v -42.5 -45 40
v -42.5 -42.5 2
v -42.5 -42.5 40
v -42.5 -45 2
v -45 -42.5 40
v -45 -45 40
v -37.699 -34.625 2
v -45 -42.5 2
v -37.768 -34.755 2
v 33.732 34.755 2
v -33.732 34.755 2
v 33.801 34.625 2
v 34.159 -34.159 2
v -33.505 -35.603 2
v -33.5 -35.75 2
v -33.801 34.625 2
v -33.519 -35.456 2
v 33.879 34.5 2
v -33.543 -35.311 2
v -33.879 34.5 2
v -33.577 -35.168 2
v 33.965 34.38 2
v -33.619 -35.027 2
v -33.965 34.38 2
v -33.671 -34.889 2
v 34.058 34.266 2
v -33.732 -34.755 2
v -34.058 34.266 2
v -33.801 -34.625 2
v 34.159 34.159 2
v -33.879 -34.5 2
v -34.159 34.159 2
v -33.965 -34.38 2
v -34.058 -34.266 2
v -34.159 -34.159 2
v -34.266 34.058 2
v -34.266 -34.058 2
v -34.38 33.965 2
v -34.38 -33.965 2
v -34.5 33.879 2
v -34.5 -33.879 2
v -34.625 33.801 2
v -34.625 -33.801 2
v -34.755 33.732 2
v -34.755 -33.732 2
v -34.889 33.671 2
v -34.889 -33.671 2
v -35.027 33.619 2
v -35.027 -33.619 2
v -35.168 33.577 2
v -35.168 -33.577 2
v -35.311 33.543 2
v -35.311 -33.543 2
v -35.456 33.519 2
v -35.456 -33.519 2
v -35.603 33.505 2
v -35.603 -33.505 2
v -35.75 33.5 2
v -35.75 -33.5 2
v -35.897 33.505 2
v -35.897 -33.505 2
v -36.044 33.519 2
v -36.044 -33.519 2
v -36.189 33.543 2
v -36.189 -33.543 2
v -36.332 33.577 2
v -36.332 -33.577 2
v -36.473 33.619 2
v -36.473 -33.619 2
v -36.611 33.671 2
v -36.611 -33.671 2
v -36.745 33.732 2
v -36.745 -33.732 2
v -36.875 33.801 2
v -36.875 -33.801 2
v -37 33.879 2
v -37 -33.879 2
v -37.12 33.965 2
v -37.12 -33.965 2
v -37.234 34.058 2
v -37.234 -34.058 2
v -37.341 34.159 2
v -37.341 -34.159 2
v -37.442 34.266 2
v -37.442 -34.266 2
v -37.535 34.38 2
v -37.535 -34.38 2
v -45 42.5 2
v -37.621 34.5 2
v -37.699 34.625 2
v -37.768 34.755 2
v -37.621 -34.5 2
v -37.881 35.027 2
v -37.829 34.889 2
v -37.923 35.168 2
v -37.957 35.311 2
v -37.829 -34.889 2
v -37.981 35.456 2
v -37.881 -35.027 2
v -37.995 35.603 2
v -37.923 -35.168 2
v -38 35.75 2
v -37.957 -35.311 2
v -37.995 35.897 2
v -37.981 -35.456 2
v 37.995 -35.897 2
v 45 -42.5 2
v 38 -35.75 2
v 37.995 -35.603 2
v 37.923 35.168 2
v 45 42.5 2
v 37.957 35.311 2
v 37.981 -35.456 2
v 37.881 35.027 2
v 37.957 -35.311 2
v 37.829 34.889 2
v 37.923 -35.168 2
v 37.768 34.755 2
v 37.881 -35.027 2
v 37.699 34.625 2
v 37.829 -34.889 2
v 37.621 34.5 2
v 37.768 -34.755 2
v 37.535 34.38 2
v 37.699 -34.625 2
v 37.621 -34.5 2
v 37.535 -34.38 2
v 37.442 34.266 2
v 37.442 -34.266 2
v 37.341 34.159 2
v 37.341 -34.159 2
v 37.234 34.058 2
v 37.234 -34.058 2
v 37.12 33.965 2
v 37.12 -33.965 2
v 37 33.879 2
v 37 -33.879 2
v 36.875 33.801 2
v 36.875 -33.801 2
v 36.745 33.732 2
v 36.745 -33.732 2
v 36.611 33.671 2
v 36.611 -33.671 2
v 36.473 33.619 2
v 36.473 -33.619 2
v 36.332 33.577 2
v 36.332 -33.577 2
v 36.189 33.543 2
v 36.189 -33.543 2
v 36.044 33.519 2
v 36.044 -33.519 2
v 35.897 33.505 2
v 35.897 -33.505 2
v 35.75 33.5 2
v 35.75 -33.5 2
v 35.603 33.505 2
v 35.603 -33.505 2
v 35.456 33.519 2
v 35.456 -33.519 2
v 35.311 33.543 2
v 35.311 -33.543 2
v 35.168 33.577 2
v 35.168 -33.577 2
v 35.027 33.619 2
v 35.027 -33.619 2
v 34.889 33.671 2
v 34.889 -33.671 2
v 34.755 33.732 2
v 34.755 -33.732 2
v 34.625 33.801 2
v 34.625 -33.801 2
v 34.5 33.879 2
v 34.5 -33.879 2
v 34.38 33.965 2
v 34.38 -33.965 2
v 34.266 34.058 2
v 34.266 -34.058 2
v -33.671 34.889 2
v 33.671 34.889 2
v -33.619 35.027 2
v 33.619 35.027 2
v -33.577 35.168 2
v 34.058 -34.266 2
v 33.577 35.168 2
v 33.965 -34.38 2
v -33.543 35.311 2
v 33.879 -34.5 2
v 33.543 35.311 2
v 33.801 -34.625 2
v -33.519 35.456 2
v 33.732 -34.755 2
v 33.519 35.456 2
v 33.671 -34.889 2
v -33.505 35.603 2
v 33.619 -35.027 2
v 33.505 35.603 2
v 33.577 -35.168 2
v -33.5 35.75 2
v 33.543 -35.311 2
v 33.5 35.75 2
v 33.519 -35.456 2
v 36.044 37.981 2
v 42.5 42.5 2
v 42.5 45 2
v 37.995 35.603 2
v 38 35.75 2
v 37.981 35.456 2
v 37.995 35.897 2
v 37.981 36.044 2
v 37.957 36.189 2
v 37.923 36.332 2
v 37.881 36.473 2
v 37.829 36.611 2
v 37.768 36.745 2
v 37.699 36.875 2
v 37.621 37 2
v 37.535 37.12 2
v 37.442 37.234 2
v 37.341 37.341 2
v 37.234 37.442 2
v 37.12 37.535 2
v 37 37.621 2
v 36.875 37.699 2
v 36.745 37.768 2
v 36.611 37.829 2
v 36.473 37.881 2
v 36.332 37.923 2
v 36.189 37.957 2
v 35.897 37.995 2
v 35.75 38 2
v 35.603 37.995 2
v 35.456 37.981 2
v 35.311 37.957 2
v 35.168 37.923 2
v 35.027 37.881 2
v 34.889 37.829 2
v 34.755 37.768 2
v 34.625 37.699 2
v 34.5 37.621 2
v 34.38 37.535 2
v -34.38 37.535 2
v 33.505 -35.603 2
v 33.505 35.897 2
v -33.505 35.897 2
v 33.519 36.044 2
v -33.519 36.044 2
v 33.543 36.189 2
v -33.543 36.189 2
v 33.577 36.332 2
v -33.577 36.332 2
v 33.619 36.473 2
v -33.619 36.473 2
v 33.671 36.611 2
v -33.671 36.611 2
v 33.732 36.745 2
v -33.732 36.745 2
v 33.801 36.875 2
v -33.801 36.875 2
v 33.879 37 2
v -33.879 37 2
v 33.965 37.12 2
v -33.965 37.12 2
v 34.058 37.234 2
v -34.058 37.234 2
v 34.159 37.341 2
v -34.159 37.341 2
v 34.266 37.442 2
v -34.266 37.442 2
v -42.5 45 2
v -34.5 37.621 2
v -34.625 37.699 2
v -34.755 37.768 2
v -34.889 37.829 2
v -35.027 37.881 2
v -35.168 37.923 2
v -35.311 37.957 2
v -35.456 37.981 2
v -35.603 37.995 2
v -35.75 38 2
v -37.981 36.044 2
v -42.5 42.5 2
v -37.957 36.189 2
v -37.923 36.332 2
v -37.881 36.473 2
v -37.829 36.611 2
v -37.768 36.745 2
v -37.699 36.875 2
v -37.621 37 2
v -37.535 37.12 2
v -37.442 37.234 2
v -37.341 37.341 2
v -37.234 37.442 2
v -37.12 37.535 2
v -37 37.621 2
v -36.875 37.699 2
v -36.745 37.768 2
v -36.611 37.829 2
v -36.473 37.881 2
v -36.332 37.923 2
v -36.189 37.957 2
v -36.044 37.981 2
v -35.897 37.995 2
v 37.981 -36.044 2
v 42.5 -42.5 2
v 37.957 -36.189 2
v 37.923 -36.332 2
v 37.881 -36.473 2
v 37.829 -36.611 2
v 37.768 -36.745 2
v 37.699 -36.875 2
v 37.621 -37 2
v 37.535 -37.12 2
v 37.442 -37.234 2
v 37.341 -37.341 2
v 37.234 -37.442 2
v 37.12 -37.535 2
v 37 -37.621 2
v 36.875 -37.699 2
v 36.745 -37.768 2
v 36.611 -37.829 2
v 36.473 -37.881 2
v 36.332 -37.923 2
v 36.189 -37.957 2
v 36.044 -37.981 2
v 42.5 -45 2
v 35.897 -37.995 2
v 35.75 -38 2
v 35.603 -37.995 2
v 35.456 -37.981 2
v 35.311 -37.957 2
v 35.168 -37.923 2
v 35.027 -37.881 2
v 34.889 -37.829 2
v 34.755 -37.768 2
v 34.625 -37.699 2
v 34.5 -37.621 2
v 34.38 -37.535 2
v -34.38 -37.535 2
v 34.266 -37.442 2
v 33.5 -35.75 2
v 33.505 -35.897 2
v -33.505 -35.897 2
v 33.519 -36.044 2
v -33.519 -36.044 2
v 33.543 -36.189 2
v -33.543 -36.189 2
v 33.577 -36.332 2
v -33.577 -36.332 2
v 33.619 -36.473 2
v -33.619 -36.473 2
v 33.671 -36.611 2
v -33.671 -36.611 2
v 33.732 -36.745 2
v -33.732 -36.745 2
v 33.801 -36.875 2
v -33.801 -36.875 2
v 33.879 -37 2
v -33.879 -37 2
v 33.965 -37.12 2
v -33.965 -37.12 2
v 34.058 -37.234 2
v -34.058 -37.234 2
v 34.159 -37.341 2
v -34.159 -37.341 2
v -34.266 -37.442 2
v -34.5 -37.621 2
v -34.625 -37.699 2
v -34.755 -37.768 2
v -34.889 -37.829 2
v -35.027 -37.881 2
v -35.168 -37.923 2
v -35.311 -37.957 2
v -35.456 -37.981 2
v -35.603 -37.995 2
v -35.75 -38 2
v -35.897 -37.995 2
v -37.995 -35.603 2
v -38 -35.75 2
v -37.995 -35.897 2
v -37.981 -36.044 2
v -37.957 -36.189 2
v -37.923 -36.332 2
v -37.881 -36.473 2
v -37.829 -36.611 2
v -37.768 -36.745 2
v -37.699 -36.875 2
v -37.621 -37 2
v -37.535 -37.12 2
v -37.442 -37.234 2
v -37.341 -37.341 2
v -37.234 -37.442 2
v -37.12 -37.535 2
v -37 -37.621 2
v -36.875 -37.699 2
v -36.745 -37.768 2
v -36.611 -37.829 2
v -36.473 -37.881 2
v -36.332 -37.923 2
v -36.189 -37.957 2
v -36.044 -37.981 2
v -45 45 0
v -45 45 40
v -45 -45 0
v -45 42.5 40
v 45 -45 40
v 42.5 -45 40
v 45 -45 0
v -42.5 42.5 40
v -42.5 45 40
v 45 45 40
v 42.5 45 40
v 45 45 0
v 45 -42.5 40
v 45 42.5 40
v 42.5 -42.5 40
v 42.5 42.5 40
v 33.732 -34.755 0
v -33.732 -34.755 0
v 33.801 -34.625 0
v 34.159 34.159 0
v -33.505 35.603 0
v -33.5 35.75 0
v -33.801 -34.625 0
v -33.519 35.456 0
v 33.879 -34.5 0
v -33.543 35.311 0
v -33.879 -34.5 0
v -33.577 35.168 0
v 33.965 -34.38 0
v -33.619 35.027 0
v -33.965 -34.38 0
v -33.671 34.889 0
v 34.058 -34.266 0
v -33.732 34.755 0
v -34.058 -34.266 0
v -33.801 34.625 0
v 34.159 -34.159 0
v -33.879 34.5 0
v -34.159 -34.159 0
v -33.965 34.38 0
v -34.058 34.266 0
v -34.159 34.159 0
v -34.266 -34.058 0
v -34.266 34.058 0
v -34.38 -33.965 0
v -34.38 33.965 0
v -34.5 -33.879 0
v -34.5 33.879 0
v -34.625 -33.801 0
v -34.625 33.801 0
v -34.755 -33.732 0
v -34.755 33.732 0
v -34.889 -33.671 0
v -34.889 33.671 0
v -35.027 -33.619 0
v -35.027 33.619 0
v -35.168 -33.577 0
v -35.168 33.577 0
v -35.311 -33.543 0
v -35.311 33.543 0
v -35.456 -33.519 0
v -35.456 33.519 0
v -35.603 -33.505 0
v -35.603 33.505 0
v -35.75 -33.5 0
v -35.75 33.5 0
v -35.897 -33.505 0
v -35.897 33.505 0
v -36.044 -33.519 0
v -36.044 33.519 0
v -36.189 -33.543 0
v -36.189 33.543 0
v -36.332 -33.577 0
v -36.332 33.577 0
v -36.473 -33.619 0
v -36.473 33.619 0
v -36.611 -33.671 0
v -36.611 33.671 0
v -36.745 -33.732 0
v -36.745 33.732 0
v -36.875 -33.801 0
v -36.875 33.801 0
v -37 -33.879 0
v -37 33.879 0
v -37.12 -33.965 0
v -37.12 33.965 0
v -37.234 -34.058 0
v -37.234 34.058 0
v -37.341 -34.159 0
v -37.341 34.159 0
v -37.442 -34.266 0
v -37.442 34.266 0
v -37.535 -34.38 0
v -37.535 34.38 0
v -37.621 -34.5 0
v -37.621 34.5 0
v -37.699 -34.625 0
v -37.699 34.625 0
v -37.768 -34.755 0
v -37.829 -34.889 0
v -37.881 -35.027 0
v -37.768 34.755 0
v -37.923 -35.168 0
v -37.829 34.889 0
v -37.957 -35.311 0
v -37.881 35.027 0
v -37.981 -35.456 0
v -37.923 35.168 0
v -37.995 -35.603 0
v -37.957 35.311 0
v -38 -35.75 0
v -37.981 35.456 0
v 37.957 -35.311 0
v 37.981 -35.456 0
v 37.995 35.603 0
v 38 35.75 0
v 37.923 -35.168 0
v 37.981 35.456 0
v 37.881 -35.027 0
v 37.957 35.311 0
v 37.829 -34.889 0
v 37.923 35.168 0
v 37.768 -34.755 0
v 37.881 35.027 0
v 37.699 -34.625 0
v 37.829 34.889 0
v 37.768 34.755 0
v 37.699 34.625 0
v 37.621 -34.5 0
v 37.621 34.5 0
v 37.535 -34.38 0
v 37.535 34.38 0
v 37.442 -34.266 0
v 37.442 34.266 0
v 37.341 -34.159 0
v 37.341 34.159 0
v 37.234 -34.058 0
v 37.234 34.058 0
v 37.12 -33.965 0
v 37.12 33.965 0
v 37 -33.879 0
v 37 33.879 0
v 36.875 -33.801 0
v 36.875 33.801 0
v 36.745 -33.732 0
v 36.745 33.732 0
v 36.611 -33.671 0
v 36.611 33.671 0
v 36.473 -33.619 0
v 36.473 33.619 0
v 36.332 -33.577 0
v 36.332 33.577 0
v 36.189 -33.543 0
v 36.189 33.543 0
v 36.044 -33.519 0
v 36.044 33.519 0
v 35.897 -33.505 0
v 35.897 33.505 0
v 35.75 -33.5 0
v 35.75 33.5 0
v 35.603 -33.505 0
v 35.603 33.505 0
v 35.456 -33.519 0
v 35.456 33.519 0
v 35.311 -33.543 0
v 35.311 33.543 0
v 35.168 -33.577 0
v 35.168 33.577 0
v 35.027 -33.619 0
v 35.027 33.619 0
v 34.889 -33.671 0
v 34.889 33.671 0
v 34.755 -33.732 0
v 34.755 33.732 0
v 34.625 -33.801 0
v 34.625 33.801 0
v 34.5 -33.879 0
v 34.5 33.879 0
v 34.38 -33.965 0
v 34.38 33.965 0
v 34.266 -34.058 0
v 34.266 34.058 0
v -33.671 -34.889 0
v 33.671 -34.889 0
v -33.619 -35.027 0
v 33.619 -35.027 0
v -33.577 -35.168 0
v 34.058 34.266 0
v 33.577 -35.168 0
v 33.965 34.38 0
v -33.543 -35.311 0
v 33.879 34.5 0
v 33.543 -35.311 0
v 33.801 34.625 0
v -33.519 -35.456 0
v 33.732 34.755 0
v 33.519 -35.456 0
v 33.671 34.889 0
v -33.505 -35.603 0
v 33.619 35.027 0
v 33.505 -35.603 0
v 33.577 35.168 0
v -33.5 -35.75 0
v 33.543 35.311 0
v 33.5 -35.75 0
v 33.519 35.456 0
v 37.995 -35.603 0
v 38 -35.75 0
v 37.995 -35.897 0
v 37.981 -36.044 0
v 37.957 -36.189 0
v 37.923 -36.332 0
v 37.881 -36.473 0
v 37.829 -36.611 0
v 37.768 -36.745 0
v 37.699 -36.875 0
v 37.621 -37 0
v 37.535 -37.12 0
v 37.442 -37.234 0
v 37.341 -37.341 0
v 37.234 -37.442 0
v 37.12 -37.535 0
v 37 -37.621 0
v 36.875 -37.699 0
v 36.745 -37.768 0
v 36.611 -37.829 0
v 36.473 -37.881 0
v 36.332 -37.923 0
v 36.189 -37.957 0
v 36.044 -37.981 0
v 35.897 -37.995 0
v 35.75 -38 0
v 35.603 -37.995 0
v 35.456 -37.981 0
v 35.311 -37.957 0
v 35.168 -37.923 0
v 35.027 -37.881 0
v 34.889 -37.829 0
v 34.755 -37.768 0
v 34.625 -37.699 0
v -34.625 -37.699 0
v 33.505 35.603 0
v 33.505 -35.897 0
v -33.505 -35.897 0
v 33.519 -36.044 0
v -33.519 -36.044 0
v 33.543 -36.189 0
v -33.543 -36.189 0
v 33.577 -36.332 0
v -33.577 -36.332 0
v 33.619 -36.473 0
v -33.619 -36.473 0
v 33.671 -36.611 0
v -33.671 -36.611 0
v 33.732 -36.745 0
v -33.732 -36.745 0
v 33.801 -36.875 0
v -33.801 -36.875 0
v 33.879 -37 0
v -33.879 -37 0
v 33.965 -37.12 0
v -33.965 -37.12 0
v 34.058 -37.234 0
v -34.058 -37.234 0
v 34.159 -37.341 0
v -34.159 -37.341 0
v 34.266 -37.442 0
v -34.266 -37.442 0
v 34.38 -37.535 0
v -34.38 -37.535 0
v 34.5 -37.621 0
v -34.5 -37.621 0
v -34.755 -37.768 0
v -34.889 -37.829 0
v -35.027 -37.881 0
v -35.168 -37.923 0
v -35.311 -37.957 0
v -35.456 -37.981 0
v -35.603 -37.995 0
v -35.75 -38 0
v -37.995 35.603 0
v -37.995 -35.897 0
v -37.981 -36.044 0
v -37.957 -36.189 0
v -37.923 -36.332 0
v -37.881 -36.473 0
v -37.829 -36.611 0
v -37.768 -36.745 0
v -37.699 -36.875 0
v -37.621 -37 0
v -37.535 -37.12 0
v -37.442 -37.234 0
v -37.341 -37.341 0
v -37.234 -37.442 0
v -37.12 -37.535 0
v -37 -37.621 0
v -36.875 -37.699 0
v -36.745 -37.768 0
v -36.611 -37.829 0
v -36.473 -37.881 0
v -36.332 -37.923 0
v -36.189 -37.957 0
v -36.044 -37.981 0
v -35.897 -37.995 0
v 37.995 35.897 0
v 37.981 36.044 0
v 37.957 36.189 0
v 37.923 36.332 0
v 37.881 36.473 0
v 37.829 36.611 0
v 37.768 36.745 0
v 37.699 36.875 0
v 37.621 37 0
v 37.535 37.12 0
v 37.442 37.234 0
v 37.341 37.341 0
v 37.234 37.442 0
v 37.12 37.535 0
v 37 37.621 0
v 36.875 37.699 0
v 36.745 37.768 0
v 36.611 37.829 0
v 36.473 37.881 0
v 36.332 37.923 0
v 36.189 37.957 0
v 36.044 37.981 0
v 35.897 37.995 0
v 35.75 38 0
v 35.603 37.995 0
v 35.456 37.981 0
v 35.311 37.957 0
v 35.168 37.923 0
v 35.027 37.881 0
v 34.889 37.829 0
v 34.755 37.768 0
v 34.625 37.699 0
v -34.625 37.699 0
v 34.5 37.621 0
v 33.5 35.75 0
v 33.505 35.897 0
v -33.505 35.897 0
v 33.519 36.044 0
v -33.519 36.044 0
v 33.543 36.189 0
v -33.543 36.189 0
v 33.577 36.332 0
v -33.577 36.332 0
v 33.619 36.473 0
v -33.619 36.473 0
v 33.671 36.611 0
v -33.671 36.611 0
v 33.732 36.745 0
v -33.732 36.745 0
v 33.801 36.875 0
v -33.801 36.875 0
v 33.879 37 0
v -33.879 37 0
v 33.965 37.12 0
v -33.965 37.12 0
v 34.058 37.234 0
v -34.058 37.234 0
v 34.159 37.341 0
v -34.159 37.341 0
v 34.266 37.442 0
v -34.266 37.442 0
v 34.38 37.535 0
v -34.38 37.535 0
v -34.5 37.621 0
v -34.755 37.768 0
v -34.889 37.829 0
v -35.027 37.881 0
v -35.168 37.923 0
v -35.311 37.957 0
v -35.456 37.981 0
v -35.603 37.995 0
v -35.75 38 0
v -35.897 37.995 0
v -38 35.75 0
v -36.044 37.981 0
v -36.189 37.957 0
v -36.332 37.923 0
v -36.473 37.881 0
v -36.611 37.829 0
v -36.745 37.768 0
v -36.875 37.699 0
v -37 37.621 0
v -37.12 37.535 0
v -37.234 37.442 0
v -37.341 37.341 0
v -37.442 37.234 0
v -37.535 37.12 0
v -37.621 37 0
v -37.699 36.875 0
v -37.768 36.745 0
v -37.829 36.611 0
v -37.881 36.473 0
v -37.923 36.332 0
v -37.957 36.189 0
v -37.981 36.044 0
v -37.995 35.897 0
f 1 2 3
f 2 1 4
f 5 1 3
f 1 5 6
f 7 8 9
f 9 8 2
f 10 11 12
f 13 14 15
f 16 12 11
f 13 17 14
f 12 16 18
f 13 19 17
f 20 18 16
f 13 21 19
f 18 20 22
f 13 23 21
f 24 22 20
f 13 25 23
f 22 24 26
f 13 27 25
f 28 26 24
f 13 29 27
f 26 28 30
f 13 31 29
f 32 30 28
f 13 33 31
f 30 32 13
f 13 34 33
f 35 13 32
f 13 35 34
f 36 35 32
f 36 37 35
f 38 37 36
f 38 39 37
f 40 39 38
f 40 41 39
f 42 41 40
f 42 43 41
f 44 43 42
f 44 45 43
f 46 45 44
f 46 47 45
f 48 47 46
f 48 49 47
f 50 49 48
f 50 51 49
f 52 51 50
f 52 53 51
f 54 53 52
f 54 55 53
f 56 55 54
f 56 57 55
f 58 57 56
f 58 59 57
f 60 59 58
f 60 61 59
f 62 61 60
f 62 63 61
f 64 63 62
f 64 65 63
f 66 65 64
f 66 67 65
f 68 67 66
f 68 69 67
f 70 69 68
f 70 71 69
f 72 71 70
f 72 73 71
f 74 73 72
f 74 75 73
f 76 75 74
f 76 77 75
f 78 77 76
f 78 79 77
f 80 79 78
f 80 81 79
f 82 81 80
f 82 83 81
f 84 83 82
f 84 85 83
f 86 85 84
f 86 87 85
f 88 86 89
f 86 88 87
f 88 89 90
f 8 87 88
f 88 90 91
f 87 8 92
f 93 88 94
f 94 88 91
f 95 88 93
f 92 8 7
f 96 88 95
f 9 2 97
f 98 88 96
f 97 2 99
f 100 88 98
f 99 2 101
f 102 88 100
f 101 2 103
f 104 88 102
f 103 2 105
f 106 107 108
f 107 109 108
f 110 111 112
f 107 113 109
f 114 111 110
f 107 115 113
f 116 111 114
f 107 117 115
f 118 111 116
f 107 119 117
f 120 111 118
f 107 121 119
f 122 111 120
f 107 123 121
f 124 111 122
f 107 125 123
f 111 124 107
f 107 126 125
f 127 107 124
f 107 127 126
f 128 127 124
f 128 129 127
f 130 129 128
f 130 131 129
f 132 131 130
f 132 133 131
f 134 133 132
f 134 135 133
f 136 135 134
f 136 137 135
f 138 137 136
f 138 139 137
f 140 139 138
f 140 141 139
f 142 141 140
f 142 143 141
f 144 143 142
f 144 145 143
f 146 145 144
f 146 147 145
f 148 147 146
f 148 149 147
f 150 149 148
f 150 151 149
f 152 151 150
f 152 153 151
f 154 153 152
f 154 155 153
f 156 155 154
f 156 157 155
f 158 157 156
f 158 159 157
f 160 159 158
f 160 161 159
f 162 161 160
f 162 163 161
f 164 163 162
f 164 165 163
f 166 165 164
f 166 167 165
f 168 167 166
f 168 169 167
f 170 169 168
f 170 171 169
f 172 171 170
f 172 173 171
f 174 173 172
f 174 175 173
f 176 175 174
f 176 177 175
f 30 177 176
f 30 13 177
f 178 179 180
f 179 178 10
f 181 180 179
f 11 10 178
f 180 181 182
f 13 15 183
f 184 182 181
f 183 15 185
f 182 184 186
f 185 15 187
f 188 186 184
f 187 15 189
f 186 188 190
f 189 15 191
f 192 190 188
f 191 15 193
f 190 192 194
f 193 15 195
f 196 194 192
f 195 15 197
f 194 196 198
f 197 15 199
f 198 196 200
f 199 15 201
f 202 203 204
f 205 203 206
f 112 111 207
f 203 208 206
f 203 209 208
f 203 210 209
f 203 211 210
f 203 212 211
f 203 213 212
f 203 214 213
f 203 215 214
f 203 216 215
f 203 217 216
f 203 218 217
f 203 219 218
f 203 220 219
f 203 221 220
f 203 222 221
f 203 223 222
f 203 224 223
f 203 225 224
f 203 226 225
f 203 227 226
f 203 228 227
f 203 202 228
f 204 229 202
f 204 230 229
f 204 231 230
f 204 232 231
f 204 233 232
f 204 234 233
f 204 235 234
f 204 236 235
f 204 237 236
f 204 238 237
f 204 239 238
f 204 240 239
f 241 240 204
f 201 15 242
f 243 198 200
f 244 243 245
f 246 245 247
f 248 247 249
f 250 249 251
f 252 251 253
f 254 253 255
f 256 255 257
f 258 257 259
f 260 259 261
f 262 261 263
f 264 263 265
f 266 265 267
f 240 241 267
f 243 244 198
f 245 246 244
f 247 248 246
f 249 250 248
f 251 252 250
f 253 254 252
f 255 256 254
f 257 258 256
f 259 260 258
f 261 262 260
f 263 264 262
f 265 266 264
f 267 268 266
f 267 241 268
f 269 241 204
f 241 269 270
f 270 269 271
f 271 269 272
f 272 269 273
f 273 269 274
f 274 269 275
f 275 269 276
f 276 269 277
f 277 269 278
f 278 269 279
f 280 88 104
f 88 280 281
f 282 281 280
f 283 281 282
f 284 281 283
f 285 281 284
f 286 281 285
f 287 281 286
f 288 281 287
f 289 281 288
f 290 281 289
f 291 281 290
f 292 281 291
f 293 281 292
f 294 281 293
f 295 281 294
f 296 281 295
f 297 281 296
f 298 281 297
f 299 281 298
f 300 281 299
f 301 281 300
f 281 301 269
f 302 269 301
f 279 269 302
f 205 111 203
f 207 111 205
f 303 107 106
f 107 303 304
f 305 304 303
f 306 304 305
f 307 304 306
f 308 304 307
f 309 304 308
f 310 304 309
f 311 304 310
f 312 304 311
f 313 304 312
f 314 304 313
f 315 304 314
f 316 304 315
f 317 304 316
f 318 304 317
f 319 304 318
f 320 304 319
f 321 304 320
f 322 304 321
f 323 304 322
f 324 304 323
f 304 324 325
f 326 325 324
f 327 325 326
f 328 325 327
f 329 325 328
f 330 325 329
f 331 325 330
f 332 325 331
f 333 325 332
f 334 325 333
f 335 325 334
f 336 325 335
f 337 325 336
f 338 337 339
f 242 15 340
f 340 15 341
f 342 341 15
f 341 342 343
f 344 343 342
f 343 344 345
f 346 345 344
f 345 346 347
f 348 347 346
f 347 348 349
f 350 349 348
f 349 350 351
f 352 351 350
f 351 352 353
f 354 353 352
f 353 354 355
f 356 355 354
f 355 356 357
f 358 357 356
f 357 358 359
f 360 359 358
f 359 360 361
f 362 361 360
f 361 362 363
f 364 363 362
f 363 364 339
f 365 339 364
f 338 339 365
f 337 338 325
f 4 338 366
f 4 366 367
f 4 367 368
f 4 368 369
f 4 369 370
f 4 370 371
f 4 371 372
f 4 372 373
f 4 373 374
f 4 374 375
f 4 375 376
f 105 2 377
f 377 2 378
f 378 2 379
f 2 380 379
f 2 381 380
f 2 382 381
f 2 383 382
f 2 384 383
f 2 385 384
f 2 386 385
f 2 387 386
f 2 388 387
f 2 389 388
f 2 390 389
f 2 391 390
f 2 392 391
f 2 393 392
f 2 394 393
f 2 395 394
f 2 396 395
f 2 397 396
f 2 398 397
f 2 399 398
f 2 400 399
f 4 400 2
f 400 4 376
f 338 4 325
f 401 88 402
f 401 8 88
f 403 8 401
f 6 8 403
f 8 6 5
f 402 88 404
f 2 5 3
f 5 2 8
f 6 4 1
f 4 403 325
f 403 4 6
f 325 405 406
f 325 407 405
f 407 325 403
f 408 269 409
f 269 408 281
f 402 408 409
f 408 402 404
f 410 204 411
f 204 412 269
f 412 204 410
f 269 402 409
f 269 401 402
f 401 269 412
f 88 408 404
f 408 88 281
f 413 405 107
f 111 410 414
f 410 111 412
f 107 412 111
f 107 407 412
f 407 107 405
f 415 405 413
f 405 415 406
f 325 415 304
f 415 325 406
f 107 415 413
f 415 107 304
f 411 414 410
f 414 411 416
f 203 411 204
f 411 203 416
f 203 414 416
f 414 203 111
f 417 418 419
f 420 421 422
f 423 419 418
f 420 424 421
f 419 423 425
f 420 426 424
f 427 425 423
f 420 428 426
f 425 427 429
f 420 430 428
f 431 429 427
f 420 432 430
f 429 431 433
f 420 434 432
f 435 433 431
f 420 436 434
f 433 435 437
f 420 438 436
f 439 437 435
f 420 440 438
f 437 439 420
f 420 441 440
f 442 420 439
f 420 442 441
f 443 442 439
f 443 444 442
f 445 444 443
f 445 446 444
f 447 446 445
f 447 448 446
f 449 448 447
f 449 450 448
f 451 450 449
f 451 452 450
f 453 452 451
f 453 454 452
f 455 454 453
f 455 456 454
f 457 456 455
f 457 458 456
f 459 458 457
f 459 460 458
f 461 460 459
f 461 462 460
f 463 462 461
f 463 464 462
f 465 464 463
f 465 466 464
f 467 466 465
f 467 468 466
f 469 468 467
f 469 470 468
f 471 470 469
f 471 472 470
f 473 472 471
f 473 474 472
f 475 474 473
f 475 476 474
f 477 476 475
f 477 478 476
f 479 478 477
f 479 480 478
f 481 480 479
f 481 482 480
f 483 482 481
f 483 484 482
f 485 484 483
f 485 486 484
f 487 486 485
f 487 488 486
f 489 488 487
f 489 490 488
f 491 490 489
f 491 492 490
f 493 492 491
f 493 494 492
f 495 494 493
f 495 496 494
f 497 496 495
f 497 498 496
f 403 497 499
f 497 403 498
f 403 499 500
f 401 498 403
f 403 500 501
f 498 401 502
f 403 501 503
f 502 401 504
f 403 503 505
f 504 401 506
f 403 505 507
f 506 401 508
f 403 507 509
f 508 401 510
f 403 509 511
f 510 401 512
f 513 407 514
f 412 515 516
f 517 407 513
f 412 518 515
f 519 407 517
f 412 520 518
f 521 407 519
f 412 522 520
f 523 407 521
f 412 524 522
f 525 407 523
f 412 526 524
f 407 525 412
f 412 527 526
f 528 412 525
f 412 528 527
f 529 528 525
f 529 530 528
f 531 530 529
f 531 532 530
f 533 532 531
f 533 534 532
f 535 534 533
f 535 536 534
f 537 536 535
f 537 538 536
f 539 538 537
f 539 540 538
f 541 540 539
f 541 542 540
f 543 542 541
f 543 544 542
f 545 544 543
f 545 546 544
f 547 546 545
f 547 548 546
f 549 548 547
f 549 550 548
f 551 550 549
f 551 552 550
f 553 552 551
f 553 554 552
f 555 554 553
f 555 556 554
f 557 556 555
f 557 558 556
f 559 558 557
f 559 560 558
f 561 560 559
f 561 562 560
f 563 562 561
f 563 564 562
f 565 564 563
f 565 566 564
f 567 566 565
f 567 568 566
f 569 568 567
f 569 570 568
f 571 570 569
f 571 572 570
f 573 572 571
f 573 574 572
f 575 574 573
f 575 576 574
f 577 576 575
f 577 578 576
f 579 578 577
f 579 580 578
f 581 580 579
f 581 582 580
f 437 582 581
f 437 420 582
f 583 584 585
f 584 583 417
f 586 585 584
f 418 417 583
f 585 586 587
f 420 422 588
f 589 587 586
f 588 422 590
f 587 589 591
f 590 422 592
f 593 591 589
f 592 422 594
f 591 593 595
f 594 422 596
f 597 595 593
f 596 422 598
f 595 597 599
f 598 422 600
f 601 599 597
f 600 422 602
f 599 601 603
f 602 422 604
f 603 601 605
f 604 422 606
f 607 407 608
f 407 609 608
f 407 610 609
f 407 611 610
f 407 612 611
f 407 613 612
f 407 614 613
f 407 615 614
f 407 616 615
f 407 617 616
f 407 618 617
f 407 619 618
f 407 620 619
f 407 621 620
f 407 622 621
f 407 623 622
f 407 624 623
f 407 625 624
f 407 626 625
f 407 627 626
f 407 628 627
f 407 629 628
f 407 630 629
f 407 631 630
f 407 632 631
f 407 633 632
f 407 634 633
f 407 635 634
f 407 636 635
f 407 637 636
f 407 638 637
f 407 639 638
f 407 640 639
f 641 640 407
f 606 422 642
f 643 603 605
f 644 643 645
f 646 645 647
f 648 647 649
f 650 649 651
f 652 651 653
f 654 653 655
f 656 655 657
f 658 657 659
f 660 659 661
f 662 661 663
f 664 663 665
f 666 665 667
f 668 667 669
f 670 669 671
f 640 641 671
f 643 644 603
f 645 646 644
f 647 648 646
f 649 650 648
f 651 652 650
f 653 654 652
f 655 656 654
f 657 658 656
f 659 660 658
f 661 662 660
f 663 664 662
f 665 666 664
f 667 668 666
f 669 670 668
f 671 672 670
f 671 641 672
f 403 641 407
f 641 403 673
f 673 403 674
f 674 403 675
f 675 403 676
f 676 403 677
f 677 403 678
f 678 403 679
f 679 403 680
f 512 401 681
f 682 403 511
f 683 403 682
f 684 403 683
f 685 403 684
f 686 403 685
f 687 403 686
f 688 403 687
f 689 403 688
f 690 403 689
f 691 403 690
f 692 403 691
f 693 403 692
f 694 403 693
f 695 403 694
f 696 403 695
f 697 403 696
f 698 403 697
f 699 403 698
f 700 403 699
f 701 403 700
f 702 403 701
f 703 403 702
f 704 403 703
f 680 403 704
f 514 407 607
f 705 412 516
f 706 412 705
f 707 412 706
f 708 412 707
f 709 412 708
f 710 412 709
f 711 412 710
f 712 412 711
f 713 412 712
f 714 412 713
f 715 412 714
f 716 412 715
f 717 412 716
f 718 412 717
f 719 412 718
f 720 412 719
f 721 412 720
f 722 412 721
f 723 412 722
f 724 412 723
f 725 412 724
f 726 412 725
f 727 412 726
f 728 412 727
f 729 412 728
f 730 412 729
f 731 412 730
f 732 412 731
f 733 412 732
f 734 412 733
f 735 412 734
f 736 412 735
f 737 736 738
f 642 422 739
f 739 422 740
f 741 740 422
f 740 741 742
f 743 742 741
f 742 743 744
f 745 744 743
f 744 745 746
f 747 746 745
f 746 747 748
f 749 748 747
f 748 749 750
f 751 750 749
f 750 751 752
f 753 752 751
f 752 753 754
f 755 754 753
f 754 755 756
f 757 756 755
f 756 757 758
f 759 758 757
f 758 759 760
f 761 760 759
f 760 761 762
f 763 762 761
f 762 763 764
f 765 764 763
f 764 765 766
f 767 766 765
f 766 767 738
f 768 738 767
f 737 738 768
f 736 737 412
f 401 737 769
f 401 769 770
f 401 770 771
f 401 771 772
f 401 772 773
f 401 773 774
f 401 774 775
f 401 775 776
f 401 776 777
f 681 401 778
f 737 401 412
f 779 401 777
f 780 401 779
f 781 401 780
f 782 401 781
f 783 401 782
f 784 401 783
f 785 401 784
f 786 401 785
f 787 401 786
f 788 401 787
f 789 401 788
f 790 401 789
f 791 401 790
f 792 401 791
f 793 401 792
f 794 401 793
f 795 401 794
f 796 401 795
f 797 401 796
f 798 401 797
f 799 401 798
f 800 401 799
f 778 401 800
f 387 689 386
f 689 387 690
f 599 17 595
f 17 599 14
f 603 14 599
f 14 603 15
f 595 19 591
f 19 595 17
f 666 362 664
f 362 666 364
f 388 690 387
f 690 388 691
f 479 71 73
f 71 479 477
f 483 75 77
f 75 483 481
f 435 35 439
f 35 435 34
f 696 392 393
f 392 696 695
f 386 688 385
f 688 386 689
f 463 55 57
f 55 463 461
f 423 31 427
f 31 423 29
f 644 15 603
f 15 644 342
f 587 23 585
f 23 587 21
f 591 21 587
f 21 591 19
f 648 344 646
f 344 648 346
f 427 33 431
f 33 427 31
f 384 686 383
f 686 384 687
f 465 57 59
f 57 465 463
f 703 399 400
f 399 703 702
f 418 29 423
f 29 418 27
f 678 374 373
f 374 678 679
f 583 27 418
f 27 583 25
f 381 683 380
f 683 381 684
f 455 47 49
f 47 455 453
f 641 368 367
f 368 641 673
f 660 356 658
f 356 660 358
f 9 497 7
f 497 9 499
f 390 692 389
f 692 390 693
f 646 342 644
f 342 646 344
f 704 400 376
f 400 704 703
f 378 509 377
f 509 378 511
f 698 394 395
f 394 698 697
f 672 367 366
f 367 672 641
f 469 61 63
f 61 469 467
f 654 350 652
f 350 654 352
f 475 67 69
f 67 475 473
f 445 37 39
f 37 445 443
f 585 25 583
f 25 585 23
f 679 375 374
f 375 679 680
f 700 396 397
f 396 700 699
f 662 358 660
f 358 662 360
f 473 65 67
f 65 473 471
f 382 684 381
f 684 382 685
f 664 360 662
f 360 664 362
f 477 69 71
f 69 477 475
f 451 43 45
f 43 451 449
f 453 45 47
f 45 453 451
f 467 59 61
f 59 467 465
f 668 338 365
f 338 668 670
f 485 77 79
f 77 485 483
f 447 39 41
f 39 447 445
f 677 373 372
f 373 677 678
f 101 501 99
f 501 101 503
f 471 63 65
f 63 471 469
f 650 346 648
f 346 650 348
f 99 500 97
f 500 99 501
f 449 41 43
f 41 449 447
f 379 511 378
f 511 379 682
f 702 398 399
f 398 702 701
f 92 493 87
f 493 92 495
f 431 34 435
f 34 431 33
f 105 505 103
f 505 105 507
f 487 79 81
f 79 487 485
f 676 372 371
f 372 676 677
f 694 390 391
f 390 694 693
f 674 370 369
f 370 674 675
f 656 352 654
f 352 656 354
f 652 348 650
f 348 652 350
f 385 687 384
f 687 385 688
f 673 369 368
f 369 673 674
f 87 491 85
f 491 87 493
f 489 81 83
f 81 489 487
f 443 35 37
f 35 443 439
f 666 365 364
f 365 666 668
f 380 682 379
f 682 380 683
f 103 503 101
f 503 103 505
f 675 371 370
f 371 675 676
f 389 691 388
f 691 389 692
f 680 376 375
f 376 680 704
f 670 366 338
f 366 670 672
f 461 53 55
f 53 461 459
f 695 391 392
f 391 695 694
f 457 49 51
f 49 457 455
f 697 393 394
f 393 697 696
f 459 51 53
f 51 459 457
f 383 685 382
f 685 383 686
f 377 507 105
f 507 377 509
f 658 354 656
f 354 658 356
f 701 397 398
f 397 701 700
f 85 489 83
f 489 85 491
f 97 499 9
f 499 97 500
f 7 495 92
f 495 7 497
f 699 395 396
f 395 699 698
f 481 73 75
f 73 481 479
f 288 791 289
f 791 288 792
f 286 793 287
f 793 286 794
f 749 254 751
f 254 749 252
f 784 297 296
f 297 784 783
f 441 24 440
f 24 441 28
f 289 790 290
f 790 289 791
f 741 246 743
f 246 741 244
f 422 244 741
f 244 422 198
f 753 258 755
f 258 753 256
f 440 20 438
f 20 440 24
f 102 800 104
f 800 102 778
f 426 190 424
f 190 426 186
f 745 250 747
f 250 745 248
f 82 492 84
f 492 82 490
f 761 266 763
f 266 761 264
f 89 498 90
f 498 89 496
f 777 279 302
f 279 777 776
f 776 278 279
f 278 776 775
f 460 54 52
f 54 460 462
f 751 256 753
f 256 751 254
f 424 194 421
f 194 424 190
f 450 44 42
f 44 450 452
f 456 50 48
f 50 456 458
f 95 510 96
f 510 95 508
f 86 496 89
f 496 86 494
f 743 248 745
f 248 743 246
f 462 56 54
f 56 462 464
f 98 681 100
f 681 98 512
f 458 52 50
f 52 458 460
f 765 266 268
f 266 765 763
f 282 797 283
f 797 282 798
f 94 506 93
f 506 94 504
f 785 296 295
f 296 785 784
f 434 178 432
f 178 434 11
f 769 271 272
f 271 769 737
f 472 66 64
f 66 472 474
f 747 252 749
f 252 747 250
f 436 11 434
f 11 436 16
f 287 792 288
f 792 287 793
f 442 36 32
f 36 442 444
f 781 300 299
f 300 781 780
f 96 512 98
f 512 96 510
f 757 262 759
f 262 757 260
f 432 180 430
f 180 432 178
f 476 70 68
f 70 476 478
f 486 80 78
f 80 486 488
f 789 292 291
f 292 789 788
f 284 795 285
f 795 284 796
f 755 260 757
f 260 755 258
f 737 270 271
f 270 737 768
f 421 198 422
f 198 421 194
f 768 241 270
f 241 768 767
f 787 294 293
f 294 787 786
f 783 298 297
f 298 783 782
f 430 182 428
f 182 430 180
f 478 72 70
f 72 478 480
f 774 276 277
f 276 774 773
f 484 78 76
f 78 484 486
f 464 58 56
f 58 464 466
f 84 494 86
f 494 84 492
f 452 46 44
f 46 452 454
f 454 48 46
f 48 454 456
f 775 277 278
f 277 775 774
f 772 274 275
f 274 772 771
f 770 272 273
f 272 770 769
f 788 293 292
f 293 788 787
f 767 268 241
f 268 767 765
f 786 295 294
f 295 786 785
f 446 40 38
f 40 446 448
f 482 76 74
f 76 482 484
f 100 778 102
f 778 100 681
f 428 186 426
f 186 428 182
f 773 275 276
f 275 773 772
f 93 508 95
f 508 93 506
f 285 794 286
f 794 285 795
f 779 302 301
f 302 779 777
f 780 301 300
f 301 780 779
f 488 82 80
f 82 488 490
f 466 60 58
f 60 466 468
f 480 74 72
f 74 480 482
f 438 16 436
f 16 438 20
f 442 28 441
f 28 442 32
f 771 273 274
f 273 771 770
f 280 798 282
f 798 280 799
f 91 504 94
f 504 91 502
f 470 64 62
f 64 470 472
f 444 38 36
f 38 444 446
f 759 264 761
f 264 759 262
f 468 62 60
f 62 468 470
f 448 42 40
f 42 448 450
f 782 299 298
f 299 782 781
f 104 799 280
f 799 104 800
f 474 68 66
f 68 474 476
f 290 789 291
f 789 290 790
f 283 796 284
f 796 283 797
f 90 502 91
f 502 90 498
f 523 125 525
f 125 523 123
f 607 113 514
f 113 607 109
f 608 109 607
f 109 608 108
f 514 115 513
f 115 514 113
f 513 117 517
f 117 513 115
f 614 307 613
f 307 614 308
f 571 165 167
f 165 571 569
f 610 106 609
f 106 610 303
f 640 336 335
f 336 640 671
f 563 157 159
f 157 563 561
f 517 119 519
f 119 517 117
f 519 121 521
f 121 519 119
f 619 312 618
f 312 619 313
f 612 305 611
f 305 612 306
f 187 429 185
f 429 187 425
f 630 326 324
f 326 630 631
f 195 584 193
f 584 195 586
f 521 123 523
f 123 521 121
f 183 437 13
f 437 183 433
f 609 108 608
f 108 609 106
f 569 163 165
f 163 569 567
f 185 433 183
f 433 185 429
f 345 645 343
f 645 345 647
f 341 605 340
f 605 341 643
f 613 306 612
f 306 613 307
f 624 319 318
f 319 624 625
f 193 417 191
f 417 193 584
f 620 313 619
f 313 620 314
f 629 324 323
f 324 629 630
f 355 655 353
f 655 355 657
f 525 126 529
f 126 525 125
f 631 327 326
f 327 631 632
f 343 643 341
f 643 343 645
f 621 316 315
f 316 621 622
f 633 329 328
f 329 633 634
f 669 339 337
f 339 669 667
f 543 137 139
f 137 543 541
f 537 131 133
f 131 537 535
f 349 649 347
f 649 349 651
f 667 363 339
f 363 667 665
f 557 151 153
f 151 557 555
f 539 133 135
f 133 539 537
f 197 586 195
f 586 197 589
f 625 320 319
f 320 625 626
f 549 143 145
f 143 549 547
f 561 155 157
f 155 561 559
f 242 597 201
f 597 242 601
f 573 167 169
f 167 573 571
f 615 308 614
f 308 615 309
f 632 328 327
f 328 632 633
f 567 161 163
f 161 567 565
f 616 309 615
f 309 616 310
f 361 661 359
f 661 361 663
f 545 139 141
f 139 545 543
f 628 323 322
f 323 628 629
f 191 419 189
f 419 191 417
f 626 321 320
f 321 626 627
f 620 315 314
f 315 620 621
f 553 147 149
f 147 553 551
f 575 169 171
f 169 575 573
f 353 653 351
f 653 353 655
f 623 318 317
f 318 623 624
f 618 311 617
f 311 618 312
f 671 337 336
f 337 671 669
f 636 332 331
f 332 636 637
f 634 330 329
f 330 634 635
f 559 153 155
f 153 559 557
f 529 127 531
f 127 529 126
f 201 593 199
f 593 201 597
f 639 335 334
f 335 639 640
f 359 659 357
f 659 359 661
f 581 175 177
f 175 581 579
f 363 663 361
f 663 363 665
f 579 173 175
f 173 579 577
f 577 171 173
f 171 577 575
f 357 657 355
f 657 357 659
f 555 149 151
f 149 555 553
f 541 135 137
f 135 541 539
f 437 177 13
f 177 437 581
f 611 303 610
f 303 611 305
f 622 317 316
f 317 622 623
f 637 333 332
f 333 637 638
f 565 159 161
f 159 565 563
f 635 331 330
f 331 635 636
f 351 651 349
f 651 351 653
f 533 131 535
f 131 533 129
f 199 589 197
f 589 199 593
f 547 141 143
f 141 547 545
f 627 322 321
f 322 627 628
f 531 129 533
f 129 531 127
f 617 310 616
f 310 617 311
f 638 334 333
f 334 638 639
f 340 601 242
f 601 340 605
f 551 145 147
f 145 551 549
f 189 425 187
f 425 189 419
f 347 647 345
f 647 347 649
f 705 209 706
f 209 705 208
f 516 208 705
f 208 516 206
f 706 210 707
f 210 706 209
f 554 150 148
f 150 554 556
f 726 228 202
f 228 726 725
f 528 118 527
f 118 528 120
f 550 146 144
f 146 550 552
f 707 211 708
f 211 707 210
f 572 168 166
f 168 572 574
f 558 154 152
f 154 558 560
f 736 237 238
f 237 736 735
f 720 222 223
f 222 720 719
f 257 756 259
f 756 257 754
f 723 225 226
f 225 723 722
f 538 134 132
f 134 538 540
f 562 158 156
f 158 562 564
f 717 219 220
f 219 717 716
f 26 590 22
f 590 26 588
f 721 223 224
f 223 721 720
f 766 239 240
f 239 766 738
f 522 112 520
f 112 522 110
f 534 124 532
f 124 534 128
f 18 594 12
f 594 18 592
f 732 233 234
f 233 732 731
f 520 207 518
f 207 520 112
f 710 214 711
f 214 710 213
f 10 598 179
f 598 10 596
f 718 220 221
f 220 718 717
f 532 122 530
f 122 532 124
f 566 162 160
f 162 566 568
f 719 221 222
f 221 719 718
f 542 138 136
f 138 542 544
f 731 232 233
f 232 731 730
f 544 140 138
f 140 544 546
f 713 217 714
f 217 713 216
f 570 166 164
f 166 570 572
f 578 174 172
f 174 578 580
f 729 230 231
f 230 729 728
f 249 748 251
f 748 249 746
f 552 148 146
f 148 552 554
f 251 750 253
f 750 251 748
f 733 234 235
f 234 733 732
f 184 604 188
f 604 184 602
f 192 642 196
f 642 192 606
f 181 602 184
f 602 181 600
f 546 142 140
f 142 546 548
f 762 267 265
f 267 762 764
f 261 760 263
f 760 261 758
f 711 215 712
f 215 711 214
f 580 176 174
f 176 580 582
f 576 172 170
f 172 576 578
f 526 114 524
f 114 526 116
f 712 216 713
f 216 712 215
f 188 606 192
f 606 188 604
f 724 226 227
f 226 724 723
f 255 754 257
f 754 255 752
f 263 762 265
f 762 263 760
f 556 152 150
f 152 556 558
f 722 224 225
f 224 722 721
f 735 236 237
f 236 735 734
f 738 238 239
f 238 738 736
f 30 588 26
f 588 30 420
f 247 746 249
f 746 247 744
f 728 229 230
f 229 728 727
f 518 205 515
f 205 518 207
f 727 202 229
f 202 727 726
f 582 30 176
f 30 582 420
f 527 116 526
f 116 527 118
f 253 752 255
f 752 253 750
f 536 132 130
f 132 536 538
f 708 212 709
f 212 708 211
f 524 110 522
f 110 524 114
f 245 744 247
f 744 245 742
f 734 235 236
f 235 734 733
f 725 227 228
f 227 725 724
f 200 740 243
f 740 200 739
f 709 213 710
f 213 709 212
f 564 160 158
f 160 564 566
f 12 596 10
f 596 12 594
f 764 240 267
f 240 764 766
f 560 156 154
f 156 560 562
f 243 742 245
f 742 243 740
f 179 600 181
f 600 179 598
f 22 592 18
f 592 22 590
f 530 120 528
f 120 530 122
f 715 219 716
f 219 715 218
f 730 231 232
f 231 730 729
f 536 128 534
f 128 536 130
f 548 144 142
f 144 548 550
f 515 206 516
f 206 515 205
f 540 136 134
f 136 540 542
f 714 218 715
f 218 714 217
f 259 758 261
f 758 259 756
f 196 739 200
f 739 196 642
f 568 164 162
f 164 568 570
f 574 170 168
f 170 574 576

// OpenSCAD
// DIY magnetic stirrer housing for an 80 mm PC case fan
// Print orientation: upside-down open box, top plate on bed (z = 0 to 2)

// ---------- Parameters ----------
top_thickness      = 2;     // top plate thickness
wall_thickness     = 2.5;   // wall thickness
box_height         = 40;    // total height of walls (z = 0 to 40)
outer_size         = 90;    // outer size in X and Y
screw_hole_d       = 4.5;   // M4 screw hole diameter
screw_hole_pitch   = 71.5;  // square pitch of screw holes
cable_notch_w      = 12;    // cable notch width
cable_notch_depth  = 8;     // notch depth from open edge (z = 32 to 40)
eps                = 0.5;   // overcut for clean differences
$fn                = 96;    // curve resolution

// ---------- Model ----------
difference() {
    union() {
        // Top plate
        translate([-outer_size/2, -outer_size/2, 0])
            cube([outer_size, outer_size, top_thickness]);

        // Four walls rising from the plate
        for (sx = [-1, 1], sy = [-1, 1])
            translate([sx > 0 ? outer_size/2 - wall_thickness : -outer_size/2,
                       sy > 0 ? outer_size/2 - wall_thickness : -outer_size/2,
                       top_thickness])
                cube([wall_thickness, wall_thickness, box_height - top_thickness]);
    }

    // Four M4 screw holes through the top plate
    for (x = [-screw_hole_pitch/2, screw_hole_pitch/2],
         y = [-screw_hole_pitch/2, screw_hole_pitch/2])
        translate([x, y, -eps])
            cylinder(d = screw_hole_d, h = top_thickness + 2*eps);

    // Cable notch in one wall (centred along the wall)
    translate([outer_size/2 - wall_thickness - cable_notch_w/2,
               0,
               box_height - top_thickness - cable_notch_depth])
        cube([cable_notch_w, wall_thickness, cable_notch_depth + eps]);
}
